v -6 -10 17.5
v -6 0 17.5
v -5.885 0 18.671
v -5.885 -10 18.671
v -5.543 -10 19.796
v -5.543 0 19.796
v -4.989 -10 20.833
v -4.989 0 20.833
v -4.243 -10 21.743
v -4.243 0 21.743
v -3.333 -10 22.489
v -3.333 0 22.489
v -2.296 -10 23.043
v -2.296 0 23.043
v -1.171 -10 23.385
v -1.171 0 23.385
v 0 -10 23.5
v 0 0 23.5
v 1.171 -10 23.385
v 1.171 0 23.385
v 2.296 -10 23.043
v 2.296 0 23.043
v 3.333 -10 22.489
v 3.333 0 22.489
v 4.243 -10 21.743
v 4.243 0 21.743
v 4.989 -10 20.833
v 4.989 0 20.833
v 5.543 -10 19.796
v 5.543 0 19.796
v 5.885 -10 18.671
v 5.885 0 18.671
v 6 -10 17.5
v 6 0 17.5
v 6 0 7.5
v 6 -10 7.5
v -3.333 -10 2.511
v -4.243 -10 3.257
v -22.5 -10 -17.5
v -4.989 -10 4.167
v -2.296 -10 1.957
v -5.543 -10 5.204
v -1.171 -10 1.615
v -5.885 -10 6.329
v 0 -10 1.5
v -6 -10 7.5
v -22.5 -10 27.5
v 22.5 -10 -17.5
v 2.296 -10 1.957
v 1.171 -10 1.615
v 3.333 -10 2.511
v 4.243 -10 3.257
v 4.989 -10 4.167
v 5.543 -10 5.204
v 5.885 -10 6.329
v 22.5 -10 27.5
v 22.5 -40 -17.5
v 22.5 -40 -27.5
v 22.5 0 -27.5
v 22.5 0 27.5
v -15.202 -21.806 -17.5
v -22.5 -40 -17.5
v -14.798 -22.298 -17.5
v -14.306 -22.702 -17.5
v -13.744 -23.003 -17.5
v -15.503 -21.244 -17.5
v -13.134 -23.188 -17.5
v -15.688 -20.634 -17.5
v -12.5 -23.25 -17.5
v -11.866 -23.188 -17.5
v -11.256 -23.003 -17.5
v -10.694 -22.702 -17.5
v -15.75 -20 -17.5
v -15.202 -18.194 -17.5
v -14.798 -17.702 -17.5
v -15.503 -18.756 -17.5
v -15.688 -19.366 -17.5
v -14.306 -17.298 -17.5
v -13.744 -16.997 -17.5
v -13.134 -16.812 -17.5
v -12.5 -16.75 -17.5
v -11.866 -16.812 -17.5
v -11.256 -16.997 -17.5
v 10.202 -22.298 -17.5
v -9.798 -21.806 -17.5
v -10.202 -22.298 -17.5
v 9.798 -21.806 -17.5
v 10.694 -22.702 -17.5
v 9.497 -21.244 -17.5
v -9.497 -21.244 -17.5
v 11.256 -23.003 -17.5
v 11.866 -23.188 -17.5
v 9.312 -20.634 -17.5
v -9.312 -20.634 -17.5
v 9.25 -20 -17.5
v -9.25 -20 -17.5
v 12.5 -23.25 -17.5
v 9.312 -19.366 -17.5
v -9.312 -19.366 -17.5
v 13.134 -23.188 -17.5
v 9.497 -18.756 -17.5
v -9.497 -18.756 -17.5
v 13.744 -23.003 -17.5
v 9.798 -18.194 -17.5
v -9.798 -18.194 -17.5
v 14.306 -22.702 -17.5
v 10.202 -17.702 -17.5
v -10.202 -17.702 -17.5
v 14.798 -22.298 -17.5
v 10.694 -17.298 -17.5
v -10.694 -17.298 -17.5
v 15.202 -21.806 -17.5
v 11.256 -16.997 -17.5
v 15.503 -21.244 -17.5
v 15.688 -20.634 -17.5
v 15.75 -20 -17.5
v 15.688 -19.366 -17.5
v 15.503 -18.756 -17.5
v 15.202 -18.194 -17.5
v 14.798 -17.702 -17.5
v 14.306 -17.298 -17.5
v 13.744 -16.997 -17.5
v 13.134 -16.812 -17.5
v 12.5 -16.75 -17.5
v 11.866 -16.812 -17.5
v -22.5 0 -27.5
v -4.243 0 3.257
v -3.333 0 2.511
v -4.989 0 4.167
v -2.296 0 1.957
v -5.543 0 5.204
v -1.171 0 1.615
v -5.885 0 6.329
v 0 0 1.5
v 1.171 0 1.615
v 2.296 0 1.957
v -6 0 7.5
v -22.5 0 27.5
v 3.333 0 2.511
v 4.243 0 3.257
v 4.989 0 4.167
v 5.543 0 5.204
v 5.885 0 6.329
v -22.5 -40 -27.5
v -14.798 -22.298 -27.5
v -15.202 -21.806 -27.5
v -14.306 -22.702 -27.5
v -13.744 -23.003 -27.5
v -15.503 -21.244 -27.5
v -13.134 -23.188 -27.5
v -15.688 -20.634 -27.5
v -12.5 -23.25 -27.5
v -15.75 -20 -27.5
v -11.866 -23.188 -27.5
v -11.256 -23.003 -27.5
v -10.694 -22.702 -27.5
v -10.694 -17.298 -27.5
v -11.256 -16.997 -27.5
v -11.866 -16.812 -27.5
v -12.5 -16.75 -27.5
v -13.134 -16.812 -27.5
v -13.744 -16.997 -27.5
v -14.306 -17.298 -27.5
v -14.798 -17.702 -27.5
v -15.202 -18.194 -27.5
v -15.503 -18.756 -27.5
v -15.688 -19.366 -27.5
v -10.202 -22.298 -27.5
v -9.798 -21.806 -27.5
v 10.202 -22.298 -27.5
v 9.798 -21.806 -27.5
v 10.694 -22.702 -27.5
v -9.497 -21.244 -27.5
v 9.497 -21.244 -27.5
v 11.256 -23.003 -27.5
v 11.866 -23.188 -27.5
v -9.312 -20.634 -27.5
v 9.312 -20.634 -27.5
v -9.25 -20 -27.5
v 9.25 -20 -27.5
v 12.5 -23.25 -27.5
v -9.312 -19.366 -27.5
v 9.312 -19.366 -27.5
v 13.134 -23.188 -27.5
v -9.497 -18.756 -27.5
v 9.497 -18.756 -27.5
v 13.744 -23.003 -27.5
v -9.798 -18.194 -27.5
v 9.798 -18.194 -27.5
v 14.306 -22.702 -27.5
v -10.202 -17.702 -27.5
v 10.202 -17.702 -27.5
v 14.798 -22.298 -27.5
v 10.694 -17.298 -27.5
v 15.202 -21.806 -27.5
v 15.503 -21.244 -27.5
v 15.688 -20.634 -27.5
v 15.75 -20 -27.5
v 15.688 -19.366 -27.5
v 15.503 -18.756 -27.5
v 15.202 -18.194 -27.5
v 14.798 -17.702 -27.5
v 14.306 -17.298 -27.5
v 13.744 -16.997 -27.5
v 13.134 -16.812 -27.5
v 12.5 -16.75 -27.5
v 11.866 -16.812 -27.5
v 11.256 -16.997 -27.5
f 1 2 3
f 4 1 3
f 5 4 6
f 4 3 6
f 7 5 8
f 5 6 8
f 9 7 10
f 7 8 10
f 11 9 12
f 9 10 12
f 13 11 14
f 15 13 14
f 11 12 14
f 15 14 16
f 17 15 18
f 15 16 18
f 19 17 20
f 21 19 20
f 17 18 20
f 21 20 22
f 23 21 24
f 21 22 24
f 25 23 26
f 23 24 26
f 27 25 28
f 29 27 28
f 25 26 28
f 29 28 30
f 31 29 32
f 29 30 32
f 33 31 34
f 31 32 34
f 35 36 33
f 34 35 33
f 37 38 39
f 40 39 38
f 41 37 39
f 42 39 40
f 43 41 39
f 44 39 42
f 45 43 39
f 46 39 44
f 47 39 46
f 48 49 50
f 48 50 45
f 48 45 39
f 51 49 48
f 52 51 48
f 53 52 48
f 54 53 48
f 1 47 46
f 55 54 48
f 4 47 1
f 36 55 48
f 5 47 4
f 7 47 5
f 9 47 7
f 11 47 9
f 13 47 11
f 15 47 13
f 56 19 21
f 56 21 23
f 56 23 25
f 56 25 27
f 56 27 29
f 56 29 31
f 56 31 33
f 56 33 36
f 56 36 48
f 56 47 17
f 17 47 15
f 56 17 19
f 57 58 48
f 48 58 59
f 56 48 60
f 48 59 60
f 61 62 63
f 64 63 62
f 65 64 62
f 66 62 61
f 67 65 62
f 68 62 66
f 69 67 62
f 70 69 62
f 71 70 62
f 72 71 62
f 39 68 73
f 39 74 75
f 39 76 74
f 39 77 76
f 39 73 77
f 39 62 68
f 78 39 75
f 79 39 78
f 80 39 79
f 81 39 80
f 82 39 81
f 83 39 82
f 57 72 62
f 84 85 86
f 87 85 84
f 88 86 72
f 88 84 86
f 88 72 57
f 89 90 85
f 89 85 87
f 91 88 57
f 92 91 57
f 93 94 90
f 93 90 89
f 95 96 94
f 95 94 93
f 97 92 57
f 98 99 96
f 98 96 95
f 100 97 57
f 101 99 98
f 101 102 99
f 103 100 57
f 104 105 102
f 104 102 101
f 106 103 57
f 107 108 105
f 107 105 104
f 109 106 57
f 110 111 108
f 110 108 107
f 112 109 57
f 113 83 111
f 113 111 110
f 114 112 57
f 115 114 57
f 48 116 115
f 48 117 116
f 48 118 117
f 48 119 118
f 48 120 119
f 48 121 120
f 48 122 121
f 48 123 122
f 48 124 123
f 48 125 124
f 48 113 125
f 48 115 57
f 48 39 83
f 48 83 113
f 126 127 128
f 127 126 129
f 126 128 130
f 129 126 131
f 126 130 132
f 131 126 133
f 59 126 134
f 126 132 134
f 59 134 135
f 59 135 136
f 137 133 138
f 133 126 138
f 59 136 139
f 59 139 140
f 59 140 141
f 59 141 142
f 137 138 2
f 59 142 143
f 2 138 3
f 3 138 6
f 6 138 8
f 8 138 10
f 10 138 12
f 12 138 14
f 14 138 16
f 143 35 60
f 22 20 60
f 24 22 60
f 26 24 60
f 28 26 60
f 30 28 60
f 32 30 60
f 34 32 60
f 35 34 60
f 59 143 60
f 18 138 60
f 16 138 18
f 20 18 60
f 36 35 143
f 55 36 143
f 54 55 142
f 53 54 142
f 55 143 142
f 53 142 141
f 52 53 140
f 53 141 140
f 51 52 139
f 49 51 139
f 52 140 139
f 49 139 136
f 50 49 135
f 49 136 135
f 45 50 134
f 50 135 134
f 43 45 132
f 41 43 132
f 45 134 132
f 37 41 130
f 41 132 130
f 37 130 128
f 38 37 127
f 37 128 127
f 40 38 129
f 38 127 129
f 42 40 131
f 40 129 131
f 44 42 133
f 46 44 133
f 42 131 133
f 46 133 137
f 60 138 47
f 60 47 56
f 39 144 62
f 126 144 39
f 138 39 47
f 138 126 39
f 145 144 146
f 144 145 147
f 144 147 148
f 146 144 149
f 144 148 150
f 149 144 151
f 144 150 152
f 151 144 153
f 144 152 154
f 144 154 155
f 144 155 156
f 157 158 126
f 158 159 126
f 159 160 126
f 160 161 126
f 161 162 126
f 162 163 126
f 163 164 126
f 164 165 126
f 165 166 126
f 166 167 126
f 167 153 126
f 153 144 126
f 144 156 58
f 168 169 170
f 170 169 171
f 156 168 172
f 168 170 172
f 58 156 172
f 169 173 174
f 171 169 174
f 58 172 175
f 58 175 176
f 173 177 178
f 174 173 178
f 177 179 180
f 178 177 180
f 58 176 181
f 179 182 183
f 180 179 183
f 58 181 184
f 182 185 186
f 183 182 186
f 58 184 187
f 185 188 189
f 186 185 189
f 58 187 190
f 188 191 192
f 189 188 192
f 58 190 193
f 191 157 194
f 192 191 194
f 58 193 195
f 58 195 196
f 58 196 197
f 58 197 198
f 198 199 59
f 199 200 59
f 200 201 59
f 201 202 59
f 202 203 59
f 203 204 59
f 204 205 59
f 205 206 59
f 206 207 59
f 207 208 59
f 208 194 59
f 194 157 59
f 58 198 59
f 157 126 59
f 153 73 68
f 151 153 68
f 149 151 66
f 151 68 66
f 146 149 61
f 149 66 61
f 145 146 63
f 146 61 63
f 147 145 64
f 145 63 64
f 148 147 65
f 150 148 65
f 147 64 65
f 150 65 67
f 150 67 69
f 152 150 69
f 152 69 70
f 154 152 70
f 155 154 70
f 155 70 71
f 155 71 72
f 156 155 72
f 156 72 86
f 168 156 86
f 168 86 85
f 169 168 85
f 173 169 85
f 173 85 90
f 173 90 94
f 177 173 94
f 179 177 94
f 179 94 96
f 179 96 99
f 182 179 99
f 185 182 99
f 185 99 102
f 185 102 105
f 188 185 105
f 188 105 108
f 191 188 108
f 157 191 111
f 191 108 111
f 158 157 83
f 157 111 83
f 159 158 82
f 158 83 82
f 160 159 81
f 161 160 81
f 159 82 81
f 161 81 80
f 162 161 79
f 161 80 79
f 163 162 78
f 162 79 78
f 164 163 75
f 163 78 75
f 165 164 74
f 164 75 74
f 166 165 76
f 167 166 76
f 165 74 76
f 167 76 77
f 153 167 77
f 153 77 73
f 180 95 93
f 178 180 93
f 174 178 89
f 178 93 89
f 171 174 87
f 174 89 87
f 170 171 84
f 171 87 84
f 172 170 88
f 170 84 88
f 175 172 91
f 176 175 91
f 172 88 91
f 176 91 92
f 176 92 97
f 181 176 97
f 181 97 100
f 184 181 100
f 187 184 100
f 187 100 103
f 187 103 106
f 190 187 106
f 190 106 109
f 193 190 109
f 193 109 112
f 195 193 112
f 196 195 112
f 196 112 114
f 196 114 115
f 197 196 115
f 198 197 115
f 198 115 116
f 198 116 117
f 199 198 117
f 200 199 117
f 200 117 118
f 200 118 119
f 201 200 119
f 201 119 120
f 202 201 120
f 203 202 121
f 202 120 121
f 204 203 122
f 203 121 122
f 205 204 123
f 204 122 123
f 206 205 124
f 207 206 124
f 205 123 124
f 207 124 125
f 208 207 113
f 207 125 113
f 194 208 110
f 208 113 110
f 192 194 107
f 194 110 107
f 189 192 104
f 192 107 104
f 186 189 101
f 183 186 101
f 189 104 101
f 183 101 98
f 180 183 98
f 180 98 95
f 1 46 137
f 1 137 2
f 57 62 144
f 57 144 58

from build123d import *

# Parameters (mm, degrees)
F0_W     = 45
F0_H     = 55
F1_DEPTH = 10
F2_W     = 45
F2_H     = 10
F3_DEPTH = 30
F4_W     = 12
F4_H     = 10
F5_DEPTH = 10
F7_D     = 12
F7_DEPTH = 16
F9_D     = 6.5
F9_DEPTH = 10


with BuildPart() as f1:
    # F0 (on Front) → F1 (new body)
    with BuildSketch(Plane.XZ):
        Rectangle(F0_W, F0_H)
    extrude(amount=F1_DEPTH)

    # F2 (on face) → F3 (join)
    with BuildSketch(Plane.XZ.offset(10)):
        with Locations((0, -22.5)):
            Rectangle(F2_W, F2_H)
    extrude(amount=F3_DEPTH)

    # F4 (on face) → F5 (cut)
    with BuildSketch(Plane.XZ.offset(10)):
        with Locations((0, 12.5)):
            Rectangle(F4_W, F4_H)
    extrude(amount=-F5_DEPTH, mode=Mode.SUBTRACT)

    # F7
    with Locations(Plane.XZ.offset(10)):
        with Locations((0, 17.5), (0, 7.5)):
            Hole(F7_D / 2, depth=F7_DEPTH)

    # F9
    with Locations(Plane(origin=(0, 0, -27.5), x_dir=(1, 0, 0), z_dir=(0, 0, -1))):
        with Locations((-12.5, 20), (12.5, 20)):
            Hole(F9_D / 2, depth=F9_DEPTH)


solid = f1.part
